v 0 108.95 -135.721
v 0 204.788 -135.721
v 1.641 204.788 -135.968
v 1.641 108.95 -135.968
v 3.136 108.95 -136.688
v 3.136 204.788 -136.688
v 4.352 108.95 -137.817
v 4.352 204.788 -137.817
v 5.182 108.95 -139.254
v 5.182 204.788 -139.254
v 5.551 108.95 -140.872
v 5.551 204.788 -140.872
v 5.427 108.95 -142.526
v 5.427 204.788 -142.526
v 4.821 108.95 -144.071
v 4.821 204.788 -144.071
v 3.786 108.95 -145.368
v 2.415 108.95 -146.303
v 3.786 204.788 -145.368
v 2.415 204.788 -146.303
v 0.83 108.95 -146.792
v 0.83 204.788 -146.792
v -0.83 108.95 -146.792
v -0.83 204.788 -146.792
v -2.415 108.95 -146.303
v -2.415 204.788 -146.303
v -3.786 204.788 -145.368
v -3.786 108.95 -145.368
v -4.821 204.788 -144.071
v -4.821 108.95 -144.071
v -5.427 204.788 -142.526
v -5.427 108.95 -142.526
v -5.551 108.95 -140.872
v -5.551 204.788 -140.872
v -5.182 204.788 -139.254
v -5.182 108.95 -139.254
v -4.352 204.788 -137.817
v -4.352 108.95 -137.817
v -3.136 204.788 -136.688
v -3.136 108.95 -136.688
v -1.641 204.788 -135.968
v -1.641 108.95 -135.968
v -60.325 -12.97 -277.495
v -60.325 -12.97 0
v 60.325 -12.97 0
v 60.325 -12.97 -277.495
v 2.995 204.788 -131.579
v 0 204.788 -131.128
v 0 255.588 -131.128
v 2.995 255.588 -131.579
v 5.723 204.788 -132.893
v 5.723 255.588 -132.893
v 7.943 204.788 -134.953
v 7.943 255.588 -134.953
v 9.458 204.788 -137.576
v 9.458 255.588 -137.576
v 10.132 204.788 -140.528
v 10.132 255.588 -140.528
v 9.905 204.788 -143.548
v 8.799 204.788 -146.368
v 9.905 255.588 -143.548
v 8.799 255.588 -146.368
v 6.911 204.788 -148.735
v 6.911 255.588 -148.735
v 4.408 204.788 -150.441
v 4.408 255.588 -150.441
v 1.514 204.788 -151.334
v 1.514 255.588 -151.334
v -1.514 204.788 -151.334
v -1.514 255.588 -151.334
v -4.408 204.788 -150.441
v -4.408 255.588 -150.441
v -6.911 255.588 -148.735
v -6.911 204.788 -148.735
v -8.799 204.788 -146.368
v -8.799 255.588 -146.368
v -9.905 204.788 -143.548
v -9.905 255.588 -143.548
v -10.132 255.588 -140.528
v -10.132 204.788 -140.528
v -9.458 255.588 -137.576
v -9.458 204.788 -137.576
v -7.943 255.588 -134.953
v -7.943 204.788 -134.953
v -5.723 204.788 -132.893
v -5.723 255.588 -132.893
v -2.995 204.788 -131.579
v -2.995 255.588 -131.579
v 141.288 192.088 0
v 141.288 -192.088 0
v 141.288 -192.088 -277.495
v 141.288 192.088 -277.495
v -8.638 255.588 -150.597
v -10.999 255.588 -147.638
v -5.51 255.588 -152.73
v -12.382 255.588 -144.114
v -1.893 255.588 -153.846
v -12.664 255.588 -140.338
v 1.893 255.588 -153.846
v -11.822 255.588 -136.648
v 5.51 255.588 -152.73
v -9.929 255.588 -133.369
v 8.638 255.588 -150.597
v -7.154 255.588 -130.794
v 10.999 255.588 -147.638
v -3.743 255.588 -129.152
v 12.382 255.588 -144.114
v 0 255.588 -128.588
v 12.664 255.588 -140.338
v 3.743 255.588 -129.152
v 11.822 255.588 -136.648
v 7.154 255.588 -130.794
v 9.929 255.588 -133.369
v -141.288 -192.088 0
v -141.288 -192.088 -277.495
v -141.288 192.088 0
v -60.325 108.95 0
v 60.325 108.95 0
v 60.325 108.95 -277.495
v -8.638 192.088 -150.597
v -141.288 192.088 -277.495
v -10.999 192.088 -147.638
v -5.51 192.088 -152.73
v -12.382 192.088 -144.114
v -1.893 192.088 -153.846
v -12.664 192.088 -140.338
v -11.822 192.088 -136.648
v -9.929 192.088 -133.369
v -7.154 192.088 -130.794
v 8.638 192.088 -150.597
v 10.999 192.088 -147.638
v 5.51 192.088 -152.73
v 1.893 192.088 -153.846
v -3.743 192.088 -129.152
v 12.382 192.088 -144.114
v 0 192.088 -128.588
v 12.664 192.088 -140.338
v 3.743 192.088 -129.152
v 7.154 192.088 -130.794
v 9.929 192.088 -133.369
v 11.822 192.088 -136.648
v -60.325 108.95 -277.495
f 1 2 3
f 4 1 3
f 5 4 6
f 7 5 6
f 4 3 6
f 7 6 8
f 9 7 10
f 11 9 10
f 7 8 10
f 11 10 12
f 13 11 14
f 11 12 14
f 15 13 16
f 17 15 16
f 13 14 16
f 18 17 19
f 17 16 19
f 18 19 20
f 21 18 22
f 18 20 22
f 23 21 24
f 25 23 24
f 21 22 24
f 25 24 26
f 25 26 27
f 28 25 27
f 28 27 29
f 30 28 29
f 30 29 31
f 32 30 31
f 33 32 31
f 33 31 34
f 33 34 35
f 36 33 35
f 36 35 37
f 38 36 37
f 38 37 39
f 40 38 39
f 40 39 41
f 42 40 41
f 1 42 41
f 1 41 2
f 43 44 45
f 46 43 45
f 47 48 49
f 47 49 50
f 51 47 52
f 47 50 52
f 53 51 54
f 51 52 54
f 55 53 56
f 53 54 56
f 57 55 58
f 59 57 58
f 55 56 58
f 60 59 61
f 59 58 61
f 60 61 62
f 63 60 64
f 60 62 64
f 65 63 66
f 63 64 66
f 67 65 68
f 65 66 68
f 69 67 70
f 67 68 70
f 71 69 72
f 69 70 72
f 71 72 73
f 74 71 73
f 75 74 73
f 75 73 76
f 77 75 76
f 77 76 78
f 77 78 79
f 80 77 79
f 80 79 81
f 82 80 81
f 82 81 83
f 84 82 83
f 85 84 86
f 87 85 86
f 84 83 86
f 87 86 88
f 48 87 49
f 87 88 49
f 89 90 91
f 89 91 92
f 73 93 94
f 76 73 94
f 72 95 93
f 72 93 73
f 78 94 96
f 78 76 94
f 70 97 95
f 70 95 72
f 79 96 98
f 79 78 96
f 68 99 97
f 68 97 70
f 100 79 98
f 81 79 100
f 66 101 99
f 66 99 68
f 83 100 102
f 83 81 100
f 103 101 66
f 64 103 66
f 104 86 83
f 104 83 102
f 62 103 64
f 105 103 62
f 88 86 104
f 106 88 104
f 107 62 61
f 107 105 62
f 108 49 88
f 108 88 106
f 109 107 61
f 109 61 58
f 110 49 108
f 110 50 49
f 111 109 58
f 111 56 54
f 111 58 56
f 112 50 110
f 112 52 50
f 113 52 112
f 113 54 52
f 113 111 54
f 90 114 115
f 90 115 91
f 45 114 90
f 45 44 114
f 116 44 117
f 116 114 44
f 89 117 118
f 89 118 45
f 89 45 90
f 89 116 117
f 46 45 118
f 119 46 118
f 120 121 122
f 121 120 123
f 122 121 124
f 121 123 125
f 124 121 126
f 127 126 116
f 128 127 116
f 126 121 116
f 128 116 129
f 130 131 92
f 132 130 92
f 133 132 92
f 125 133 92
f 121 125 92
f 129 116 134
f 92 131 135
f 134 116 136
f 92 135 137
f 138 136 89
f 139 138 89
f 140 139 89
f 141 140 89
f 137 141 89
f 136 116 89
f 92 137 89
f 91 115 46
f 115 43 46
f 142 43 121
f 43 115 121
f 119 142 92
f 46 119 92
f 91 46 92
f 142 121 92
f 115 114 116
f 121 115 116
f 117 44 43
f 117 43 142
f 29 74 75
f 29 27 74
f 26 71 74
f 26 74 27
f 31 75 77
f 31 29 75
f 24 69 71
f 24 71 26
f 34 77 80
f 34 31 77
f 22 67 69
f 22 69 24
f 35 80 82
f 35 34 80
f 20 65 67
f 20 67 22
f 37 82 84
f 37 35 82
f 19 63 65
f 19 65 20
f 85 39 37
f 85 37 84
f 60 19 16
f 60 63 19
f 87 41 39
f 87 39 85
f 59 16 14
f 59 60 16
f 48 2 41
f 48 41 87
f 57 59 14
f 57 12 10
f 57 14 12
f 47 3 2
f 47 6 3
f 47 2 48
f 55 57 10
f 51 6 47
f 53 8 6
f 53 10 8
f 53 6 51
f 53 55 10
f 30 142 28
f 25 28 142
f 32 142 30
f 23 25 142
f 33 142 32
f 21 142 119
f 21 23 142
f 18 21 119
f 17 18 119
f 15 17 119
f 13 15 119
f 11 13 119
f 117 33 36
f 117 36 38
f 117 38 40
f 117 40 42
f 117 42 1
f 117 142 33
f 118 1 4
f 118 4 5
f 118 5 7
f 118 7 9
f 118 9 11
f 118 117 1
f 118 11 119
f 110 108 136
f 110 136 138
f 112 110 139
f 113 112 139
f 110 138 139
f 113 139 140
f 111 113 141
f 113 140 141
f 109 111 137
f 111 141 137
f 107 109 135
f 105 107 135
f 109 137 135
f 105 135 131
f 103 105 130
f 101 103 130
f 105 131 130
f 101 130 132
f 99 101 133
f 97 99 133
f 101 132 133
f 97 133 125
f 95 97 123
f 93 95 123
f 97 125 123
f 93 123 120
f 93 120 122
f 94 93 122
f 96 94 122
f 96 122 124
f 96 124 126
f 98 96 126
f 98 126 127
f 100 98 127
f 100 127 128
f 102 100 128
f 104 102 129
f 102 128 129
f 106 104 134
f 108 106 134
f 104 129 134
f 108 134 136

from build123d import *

# Parameters (mm, degrees)
SKETCH1_W                 = 282.575
SKETCH1_H                 = 384.175
CELL_BODY_DEPTH           = 277.495
SKETCH5_W                 = 120.65
SKETCH5_H                 = 121.92
SEE_THROUGH_HOLE_DEPTH    = 282.575
SKETCH6_R                 = 12.7
CHIMNEY_DEPTH             = 63.5
SKETCH9_R                 = 10.16
CHIMNEY_COUNTERBORE_DEPTH = 50.8
SKETCH10_R                = 5.566584011
CHIMNEY_HOLE_DEPTH        = 98.806


with BuildPart() as part:
    # Sketch1 → Cell body (new body)
    with BuildSketch(Plane.XY):
        Rectangle(SKETCH1_W, SKETCH1_H)
    extrude(amount=-CELL_BODY_DEPTH)

    # Sketch5 → see-through hole (cut)
    with BuildSketch(Plane.XY):
        with Locations((0, 47.989561969)):
            Rectangle(SKETCH5_W, SKETCH5_H)
    extrude(amount=-SEE_THROUGH_HOLE_DEPTH, mode=Mode.SUBTRACT)

    # Sketch6 → Chimney (add)
    with BuildSketch(Plane(origin=(0, 192.0875, 0), x_dir=(1, 0, 0), z_dir=(0, 1, 0))):
        with Locations(Location((0, 141.2875, 0), (0, 0, 270))):
            Circle(SKETCH6_R)
    extrude(amount=CHIMNEY_DEPTH)

    # Sketch9 → Chimney counterbore (cut)
    with BuildSketch(Plane(origin=(0, 255.5875, 0), x_dir=(1, 0, 0), z_dir=(0, 1, 0))):
        with Locations(Location((0, 141.2875, 0), (0, 0, 270))):
            Circle(SKETCH9_R)
    extrude(amount=-CHIMNEY_COUNTERBORE_DEPTH, mode=Mode.SUBTRACT)

    # Sketch10 → Chimney hole (cut)
    with BuildSketch(Plane(origin=(0, 204.7875, 0), x_dir=(1, 0, 0), z_dir=(0, 1, 0))):
        with Locations(Location((0, 141.2875, 0), (0, 0, 270))):
            Circle(SKETCH10_R)
    extrude(amount=-CHIMNEY_HOLE_DEPTH, mode=Mode.SUBTRACT)


solid = part.part
